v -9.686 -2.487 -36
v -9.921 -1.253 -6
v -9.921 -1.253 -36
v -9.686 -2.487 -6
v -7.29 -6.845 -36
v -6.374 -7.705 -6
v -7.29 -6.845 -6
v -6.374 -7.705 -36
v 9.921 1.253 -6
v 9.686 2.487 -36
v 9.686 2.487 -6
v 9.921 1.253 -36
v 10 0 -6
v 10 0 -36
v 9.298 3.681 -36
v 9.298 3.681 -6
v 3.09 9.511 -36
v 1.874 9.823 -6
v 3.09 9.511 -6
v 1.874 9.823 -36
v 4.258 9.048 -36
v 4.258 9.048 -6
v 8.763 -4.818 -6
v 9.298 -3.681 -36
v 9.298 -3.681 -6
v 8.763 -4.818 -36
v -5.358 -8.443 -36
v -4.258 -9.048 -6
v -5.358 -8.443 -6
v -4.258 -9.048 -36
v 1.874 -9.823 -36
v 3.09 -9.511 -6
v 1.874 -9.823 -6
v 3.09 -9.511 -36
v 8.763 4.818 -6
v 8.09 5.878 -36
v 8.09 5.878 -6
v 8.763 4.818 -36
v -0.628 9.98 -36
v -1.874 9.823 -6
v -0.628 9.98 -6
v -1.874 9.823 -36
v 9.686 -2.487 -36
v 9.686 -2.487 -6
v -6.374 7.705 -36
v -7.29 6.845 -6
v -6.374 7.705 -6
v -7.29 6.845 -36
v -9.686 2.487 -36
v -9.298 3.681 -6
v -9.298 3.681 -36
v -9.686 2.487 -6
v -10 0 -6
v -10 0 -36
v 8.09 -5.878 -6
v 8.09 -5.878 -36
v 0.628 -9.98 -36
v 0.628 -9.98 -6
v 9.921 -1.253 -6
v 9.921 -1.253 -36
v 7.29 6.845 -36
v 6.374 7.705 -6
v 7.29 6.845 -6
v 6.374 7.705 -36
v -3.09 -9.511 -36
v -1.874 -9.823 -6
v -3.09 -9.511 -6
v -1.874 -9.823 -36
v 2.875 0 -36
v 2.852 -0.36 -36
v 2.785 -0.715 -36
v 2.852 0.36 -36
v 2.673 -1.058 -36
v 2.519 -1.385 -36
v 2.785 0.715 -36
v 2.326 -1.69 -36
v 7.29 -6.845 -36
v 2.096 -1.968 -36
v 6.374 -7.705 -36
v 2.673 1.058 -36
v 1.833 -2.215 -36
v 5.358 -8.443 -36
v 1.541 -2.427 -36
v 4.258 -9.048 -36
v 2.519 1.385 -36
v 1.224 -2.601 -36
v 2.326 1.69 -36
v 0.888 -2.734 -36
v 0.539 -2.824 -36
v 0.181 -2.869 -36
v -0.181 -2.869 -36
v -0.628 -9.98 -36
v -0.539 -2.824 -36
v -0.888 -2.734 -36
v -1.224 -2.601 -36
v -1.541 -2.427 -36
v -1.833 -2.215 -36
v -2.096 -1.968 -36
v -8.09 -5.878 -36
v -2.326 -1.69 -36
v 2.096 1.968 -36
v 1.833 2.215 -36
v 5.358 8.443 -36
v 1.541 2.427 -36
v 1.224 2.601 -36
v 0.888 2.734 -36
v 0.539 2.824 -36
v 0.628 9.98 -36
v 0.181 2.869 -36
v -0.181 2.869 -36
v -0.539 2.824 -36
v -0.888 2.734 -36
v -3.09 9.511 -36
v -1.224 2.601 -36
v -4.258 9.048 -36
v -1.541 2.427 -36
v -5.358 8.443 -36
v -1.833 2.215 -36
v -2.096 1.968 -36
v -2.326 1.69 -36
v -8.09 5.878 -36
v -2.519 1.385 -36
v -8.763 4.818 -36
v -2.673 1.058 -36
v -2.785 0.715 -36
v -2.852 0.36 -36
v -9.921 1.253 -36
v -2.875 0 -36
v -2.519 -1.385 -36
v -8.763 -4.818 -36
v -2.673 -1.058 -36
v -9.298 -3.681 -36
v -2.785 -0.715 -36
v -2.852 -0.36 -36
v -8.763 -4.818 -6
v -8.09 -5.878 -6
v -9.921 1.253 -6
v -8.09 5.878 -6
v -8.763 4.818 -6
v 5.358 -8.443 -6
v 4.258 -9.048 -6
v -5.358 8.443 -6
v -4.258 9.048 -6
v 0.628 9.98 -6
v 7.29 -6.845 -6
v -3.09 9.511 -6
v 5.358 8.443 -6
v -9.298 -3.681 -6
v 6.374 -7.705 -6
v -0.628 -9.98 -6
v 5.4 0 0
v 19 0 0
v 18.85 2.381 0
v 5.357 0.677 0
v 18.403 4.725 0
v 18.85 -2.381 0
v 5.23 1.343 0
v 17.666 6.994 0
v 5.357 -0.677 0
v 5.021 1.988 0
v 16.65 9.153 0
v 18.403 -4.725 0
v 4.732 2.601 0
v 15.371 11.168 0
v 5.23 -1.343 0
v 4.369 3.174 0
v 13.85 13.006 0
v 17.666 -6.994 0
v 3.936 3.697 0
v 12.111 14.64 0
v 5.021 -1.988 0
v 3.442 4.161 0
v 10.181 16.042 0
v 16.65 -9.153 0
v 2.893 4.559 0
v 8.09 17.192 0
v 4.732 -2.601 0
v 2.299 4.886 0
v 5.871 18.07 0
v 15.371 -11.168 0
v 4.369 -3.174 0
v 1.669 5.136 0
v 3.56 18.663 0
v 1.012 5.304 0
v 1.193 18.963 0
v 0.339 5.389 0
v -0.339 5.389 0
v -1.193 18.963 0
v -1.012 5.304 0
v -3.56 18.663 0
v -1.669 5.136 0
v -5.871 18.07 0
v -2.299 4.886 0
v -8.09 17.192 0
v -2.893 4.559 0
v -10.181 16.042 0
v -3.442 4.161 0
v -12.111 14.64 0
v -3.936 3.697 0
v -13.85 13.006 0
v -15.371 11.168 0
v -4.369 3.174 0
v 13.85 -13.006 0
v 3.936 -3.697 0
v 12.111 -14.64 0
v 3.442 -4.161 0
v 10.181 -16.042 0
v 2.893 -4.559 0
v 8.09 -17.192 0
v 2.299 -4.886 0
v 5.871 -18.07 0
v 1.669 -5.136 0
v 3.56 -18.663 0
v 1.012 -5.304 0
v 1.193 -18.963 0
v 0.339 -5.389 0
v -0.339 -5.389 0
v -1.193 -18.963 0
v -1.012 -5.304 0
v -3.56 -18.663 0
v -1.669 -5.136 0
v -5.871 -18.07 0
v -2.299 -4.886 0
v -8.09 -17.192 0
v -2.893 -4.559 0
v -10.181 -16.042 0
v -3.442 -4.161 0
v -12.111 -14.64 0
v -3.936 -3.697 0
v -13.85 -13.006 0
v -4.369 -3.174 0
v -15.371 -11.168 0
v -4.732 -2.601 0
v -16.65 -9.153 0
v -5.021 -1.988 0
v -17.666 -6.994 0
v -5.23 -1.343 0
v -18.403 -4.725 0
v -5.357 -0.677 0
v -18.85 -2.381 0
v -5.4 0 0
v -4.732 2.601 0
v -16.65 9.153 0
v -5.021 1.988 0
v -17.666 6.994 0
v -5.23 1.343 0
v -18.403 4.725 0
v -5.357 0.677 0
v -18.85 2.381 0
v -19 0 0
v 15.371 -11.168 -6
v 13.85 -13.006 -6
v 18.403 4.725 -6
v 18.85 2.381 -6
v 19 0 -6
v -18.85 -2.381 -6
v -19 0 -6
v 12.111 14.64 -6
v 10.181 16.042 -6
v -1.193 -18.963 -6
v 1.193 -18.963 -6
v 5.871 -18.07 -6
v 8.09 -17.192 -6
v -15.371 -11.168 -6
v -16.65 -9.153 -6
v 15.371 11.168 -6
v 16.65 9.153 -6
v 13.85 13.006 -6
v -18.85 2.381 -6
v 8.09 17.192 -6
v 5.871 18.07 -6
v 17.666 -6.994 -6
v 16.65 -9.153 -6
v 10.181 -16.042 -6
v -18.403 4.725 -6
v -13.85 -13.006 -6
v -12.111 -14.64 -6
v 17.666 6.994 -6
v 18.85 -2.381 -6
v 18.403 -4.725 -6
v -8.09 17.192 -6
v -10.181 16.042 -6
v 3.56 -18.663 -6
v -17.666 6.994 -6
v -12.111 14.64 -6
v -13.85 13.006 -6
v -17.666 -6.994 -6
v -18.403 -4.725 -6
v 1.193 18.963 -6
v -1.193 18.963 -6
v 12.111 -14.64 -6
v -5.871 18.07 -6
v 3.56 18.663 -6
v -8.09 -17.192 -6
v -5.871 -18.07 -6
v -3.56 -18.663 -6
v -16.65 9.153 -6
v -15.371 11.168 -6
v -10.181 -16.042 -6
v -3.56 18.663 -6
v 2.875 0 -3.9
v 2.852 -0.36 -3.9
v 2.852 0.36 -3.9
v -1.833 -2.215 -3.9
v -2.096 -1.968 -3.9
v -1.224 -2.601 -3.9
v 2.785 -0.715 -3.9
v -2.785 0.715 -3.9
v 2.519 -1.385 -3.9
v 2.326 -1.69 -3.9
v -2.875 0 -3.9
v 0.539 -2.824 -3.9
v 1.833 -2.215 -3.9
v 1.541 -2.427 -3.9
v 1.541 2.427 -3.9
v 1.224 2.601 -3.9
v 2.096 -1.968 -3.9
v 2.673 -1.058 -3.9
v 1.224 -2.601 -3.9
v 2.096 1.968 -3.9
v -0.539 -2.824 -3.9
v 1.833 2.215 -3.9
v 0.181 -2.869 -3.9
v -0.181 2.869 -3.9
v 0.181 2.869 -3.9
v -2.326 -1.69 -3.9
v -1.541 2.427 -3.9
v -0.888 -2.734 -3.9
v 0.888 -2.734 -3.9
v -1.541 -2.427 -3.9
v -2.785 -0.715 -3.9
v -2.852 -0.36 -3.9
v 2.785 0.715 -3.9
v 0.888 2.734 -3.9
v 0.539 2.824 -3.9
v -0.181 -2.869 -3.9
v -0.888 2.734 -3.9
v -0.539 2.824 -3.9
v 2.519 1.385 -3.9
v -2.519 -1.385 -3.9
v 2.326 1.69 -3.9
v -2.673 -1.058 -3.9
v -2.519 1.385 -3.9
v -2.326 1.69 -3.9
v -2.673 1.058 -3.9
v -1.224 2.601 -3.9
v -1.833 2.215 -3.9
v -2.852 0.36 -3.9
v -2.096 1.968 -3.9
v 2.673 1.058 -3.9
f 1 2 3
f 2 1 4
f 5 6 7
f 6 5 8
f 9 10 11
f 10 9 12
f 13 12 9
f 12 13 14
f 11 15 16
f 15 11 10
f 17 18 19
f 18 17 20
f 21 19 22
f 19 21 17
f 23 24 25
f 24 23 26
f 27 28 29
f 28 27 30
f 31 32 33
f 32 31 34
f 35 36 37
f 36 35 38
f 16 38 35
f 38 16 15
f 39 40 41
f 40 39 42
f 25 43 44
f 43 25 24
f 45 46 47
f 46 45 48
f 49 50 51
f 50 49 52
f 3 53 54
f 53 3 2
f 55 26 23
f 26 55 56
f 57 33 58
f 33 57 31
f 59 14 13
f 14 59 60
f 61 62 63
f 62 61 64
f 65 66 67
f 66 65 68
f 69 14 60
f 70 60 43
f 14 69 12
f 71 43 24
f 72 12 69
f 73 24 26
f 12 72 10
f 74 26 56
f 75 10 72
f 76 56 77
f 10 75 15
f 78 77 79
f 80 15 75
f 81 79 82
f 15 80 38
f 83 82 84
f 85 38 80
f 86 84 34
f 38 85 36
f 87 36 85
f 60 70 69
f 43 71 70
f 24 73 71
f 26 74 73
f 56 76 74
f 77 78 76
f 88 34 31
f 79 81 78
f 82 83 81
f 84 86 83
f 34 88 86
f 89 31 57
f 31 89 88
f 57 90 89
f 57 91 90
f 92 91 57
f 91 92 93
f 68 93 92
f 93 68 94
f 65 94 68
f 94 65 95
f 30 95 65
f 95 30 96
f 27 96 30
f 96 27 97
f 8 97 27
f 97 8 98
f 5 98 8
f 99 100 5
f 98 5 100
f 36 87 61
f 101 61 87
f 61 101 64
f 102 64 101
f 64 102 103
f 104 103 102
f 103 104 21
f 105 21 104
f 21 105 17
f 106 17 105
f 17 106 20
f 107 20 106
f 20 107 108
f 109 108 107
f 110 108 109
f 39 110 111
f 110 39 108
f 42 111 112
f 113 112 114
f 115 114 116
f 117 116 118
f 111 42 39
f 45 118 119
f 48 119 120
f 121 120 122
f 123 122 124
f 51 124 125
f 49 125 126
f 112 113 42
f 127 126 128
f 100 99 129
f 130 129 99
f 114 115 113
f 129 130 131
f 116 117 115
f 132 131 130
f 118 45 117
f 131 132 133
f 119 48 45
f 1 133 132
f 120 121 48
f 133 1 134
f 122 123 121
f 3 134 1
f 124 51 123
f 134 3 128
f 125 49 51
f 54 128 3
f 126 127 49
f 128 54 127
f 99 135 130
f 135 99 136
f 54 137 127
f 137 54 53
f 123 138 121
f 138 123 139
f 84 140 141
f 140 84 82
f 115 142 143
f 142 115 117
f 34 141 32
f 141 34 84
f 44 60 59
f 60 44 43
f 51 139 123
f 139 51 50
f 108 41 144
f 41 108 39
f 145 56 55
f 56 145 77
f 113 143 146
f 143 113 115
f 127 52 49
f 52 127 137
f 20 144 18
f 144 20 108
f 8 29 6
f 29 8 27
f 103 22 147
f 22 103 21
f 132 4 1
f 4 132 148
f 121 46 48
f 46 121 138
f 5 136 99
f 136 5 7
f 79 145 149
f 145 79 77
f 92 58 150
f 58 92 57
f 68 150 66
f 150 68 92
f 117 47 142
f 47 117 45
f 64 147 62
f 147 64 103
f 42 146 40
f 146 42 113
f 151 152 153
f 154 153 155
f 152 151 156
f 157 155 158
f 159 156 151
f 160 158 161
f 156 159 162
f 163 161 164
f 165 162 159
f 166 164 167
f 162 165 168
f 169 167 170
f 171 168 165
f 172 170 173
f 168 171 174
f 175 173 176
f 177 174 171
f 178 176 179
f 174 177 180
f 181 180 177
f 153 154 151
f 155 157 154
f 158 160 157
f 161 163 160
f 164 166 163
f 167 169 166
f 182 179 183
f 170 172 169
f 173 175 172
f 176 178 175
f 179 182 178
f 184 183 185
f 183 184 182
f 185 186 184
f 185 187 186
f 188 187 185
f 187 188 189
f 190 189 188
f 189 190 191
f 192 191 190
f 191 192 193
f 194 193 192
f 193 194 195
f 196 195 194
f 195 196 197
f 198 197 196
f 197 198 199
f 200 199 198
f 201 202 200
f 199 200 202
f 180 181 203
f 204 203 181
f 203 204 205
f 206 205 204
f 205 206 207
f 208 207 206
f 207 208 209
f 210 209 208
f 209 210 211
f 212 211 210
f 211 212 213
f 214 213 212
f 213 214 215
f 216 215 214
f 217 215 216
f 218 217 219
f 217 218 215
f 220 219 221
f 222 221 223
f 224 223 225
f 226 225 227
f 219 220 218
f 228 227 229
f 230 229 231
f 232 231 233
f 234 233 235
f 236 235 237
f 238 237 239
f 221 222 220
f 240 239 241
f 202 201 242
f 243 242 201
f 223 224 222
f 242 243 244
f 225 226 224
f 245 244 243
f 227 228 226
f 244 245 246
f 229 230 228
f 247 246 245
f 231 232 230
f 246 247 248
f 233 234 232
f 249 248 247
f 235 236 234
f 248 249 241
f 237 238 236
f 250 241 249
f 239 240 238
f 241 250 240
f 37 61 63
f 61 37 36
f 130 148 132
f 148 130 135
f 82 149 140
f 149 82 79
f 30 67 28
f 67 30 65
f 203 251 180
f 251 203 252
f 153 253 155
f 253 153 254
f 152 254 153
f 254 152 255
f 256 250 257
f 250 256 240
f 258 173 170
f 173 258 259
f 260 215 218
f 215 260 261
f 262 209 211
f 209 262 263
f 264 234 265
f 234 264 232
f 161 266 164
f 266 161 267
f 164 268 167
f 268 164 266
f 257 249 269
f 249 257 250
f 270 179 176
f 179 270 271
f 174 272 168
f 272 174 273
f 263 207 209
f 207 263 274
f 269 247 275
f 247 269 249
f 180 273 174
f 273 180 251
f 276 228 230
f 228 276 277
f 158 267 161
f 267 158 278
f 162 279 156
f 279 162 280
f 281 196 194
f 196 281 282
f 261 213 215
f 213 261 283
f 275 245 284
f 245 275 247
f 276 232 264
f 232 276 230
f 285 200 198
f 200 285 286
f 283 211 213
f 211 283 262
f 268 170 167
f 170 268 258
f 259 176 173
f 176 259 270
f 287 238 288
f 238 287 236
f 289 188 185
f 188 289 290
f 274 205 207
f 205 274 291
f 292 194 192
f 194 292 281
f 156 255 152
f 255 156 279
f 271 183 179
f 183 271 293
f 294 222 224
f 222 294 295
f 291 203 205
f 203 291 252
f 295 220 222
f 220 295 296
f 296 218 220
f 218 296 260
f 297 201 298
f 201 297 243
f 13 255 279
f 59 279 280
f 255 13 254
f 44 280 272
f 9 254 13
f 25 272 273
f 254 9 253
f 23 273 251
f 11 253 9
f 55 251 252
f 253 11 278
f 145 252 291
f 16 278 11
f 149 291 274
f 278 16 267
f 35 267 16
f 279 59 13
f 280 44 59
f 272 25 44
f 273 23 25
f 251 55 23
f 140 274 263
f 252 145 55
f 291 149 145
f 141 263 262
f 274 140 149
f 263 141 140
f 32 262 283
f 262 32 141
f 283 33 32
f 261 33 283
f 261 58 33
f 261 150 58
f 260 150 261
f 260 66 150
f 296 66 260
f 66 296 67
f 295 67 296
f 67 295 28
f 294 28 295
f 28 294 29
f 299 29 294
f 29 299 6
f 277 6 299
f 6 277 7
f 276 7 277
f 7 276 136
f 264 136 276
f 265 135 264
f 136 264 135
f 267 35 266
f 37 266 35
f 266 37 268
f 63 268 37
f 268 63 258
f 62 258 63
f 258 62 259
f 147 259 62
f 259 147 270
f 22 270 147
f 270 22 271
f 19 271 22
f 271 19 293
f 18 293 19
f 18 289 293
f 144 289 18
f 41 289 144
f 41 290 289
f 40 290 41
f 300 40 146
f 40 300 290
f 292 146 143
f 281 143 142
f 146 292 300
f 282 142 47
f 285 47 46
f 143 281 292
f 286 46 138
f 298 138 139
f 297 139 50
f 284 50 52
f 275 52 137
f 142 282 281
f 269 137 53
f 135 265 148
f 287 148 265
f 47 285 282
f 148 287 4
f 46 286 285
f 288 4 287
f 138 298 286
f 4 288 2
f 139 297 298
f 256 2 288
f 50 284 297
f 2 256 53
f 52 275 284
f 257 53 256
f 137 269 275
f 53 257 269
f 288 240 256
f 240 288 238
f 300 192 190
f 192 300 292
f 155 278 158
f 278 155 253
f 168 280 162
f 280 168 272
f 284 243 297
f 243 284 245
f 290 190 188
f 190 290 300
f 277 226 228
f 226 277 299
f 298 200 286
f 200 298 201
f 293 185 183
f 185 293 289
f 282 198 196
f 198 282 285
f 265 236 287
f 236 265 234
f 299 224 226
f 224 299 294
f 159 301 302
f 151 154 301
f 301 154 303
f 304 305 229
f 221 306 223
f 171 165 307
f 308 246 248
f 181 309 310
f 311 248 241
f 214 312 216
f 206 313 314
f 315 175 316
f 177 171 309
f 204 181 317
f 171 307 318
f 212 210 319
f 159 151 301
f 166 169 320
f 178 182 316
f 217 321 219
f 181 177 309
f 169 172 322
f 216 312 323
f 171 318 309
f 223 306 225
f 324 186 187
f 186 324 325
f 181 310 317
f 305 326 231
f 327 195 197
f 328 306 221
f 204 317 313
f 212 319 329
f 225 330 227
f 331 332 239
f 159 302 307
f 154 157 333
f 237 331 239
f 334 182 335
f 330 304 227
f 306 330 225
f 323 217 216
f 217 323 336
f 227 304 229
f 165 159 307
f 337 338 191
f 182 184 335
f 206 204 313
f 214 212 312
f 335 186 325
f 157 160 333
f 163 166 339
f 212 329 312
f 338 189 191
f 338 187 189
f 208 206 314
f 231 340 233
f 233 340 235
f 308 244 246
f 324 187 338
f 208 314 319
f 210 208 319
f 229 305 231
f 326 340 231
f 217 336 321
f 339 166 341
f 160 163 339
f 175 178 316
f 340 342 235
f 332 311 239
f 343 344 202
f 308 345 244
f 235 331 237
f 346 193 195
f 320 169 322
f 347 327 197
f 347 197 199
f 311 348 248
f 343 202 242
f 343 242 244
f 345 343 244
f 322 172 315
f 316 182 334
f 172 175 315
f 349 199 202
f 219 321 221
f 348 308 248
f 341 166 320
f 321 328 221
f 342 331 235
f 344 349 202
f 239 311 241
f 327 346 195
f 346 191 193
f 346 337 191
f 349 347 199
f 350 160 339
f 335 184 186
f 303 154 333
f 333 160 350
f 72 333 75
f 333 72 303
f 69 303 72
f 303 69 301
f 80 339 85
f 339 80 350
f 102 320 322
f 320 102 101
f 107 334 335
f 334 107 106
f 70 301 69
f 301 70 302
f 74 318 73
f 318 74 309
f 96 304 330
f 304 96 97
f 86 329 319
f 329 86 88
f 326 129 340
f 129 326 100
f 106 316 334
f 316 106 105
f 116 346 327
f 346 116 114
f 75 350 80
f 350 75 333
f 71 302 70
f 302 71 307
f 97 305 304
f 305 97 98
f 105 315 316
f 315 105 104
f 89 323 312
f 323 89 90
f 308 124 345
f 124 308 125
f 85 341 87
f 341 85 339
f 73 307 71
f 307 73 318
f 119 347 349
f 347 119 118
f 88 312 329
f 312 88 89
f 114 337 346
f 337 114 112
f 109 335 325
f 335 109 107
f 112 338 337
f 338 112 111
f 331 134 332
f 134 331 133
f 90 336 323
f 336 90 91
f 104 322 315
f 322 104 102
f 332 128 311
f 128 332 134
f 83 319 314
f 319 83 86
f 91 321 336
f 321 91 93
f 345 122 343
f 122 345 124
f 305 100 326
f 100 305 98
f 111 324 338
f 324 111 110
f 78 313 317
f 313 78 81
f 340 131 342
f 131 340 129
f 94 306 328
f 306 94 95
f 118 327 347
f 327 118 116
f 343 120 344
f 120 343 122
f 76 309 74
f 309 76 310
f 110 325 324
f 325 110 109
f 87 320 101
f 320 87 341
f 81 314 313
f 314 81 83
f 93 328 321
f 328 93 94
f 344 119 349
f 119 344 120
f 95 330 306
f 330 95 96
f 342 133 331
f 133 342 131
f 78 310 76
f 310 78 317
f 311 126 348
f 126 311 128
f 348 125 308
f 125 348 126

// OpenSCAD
$fn = 50;


difference() {
	union() {
		translate(v = [0, 0, -36.0000000000]) {
			cylinder(h = 36, r = 10.0000000000);
		}
		translate(v = [0, 0, -6.0000000000]) {
			cylinder(h = 6, r = 19.0000000000);
		}
	}
	union() {
		translate(v = [0, 0, 0]) {
			rotate(a = [0, 0, 0]) {
				difference() {
					union() {
						#translate(v = [0, 0, -36.0000000000]) {
							cylinder(h = 36, r = 2.6000000000);
						}
						#translate(v = [0, 0, -3.9000000000]) {
							cylinder(h = 3.9000000000, r1 = 2.8750000000, r2 = 5.4000000000);
						}
						#translate(v = [0, 0, -36.0000000000]) {
							cylinder(h = 36, r = 2.8750000000);
						}
						#translate(v = [0, 0, -36.0000000000]) {
							cylinder(h = 36, r = 2.6000000000);
						}
					}
					union();
				}
			}
		}
	}
}
